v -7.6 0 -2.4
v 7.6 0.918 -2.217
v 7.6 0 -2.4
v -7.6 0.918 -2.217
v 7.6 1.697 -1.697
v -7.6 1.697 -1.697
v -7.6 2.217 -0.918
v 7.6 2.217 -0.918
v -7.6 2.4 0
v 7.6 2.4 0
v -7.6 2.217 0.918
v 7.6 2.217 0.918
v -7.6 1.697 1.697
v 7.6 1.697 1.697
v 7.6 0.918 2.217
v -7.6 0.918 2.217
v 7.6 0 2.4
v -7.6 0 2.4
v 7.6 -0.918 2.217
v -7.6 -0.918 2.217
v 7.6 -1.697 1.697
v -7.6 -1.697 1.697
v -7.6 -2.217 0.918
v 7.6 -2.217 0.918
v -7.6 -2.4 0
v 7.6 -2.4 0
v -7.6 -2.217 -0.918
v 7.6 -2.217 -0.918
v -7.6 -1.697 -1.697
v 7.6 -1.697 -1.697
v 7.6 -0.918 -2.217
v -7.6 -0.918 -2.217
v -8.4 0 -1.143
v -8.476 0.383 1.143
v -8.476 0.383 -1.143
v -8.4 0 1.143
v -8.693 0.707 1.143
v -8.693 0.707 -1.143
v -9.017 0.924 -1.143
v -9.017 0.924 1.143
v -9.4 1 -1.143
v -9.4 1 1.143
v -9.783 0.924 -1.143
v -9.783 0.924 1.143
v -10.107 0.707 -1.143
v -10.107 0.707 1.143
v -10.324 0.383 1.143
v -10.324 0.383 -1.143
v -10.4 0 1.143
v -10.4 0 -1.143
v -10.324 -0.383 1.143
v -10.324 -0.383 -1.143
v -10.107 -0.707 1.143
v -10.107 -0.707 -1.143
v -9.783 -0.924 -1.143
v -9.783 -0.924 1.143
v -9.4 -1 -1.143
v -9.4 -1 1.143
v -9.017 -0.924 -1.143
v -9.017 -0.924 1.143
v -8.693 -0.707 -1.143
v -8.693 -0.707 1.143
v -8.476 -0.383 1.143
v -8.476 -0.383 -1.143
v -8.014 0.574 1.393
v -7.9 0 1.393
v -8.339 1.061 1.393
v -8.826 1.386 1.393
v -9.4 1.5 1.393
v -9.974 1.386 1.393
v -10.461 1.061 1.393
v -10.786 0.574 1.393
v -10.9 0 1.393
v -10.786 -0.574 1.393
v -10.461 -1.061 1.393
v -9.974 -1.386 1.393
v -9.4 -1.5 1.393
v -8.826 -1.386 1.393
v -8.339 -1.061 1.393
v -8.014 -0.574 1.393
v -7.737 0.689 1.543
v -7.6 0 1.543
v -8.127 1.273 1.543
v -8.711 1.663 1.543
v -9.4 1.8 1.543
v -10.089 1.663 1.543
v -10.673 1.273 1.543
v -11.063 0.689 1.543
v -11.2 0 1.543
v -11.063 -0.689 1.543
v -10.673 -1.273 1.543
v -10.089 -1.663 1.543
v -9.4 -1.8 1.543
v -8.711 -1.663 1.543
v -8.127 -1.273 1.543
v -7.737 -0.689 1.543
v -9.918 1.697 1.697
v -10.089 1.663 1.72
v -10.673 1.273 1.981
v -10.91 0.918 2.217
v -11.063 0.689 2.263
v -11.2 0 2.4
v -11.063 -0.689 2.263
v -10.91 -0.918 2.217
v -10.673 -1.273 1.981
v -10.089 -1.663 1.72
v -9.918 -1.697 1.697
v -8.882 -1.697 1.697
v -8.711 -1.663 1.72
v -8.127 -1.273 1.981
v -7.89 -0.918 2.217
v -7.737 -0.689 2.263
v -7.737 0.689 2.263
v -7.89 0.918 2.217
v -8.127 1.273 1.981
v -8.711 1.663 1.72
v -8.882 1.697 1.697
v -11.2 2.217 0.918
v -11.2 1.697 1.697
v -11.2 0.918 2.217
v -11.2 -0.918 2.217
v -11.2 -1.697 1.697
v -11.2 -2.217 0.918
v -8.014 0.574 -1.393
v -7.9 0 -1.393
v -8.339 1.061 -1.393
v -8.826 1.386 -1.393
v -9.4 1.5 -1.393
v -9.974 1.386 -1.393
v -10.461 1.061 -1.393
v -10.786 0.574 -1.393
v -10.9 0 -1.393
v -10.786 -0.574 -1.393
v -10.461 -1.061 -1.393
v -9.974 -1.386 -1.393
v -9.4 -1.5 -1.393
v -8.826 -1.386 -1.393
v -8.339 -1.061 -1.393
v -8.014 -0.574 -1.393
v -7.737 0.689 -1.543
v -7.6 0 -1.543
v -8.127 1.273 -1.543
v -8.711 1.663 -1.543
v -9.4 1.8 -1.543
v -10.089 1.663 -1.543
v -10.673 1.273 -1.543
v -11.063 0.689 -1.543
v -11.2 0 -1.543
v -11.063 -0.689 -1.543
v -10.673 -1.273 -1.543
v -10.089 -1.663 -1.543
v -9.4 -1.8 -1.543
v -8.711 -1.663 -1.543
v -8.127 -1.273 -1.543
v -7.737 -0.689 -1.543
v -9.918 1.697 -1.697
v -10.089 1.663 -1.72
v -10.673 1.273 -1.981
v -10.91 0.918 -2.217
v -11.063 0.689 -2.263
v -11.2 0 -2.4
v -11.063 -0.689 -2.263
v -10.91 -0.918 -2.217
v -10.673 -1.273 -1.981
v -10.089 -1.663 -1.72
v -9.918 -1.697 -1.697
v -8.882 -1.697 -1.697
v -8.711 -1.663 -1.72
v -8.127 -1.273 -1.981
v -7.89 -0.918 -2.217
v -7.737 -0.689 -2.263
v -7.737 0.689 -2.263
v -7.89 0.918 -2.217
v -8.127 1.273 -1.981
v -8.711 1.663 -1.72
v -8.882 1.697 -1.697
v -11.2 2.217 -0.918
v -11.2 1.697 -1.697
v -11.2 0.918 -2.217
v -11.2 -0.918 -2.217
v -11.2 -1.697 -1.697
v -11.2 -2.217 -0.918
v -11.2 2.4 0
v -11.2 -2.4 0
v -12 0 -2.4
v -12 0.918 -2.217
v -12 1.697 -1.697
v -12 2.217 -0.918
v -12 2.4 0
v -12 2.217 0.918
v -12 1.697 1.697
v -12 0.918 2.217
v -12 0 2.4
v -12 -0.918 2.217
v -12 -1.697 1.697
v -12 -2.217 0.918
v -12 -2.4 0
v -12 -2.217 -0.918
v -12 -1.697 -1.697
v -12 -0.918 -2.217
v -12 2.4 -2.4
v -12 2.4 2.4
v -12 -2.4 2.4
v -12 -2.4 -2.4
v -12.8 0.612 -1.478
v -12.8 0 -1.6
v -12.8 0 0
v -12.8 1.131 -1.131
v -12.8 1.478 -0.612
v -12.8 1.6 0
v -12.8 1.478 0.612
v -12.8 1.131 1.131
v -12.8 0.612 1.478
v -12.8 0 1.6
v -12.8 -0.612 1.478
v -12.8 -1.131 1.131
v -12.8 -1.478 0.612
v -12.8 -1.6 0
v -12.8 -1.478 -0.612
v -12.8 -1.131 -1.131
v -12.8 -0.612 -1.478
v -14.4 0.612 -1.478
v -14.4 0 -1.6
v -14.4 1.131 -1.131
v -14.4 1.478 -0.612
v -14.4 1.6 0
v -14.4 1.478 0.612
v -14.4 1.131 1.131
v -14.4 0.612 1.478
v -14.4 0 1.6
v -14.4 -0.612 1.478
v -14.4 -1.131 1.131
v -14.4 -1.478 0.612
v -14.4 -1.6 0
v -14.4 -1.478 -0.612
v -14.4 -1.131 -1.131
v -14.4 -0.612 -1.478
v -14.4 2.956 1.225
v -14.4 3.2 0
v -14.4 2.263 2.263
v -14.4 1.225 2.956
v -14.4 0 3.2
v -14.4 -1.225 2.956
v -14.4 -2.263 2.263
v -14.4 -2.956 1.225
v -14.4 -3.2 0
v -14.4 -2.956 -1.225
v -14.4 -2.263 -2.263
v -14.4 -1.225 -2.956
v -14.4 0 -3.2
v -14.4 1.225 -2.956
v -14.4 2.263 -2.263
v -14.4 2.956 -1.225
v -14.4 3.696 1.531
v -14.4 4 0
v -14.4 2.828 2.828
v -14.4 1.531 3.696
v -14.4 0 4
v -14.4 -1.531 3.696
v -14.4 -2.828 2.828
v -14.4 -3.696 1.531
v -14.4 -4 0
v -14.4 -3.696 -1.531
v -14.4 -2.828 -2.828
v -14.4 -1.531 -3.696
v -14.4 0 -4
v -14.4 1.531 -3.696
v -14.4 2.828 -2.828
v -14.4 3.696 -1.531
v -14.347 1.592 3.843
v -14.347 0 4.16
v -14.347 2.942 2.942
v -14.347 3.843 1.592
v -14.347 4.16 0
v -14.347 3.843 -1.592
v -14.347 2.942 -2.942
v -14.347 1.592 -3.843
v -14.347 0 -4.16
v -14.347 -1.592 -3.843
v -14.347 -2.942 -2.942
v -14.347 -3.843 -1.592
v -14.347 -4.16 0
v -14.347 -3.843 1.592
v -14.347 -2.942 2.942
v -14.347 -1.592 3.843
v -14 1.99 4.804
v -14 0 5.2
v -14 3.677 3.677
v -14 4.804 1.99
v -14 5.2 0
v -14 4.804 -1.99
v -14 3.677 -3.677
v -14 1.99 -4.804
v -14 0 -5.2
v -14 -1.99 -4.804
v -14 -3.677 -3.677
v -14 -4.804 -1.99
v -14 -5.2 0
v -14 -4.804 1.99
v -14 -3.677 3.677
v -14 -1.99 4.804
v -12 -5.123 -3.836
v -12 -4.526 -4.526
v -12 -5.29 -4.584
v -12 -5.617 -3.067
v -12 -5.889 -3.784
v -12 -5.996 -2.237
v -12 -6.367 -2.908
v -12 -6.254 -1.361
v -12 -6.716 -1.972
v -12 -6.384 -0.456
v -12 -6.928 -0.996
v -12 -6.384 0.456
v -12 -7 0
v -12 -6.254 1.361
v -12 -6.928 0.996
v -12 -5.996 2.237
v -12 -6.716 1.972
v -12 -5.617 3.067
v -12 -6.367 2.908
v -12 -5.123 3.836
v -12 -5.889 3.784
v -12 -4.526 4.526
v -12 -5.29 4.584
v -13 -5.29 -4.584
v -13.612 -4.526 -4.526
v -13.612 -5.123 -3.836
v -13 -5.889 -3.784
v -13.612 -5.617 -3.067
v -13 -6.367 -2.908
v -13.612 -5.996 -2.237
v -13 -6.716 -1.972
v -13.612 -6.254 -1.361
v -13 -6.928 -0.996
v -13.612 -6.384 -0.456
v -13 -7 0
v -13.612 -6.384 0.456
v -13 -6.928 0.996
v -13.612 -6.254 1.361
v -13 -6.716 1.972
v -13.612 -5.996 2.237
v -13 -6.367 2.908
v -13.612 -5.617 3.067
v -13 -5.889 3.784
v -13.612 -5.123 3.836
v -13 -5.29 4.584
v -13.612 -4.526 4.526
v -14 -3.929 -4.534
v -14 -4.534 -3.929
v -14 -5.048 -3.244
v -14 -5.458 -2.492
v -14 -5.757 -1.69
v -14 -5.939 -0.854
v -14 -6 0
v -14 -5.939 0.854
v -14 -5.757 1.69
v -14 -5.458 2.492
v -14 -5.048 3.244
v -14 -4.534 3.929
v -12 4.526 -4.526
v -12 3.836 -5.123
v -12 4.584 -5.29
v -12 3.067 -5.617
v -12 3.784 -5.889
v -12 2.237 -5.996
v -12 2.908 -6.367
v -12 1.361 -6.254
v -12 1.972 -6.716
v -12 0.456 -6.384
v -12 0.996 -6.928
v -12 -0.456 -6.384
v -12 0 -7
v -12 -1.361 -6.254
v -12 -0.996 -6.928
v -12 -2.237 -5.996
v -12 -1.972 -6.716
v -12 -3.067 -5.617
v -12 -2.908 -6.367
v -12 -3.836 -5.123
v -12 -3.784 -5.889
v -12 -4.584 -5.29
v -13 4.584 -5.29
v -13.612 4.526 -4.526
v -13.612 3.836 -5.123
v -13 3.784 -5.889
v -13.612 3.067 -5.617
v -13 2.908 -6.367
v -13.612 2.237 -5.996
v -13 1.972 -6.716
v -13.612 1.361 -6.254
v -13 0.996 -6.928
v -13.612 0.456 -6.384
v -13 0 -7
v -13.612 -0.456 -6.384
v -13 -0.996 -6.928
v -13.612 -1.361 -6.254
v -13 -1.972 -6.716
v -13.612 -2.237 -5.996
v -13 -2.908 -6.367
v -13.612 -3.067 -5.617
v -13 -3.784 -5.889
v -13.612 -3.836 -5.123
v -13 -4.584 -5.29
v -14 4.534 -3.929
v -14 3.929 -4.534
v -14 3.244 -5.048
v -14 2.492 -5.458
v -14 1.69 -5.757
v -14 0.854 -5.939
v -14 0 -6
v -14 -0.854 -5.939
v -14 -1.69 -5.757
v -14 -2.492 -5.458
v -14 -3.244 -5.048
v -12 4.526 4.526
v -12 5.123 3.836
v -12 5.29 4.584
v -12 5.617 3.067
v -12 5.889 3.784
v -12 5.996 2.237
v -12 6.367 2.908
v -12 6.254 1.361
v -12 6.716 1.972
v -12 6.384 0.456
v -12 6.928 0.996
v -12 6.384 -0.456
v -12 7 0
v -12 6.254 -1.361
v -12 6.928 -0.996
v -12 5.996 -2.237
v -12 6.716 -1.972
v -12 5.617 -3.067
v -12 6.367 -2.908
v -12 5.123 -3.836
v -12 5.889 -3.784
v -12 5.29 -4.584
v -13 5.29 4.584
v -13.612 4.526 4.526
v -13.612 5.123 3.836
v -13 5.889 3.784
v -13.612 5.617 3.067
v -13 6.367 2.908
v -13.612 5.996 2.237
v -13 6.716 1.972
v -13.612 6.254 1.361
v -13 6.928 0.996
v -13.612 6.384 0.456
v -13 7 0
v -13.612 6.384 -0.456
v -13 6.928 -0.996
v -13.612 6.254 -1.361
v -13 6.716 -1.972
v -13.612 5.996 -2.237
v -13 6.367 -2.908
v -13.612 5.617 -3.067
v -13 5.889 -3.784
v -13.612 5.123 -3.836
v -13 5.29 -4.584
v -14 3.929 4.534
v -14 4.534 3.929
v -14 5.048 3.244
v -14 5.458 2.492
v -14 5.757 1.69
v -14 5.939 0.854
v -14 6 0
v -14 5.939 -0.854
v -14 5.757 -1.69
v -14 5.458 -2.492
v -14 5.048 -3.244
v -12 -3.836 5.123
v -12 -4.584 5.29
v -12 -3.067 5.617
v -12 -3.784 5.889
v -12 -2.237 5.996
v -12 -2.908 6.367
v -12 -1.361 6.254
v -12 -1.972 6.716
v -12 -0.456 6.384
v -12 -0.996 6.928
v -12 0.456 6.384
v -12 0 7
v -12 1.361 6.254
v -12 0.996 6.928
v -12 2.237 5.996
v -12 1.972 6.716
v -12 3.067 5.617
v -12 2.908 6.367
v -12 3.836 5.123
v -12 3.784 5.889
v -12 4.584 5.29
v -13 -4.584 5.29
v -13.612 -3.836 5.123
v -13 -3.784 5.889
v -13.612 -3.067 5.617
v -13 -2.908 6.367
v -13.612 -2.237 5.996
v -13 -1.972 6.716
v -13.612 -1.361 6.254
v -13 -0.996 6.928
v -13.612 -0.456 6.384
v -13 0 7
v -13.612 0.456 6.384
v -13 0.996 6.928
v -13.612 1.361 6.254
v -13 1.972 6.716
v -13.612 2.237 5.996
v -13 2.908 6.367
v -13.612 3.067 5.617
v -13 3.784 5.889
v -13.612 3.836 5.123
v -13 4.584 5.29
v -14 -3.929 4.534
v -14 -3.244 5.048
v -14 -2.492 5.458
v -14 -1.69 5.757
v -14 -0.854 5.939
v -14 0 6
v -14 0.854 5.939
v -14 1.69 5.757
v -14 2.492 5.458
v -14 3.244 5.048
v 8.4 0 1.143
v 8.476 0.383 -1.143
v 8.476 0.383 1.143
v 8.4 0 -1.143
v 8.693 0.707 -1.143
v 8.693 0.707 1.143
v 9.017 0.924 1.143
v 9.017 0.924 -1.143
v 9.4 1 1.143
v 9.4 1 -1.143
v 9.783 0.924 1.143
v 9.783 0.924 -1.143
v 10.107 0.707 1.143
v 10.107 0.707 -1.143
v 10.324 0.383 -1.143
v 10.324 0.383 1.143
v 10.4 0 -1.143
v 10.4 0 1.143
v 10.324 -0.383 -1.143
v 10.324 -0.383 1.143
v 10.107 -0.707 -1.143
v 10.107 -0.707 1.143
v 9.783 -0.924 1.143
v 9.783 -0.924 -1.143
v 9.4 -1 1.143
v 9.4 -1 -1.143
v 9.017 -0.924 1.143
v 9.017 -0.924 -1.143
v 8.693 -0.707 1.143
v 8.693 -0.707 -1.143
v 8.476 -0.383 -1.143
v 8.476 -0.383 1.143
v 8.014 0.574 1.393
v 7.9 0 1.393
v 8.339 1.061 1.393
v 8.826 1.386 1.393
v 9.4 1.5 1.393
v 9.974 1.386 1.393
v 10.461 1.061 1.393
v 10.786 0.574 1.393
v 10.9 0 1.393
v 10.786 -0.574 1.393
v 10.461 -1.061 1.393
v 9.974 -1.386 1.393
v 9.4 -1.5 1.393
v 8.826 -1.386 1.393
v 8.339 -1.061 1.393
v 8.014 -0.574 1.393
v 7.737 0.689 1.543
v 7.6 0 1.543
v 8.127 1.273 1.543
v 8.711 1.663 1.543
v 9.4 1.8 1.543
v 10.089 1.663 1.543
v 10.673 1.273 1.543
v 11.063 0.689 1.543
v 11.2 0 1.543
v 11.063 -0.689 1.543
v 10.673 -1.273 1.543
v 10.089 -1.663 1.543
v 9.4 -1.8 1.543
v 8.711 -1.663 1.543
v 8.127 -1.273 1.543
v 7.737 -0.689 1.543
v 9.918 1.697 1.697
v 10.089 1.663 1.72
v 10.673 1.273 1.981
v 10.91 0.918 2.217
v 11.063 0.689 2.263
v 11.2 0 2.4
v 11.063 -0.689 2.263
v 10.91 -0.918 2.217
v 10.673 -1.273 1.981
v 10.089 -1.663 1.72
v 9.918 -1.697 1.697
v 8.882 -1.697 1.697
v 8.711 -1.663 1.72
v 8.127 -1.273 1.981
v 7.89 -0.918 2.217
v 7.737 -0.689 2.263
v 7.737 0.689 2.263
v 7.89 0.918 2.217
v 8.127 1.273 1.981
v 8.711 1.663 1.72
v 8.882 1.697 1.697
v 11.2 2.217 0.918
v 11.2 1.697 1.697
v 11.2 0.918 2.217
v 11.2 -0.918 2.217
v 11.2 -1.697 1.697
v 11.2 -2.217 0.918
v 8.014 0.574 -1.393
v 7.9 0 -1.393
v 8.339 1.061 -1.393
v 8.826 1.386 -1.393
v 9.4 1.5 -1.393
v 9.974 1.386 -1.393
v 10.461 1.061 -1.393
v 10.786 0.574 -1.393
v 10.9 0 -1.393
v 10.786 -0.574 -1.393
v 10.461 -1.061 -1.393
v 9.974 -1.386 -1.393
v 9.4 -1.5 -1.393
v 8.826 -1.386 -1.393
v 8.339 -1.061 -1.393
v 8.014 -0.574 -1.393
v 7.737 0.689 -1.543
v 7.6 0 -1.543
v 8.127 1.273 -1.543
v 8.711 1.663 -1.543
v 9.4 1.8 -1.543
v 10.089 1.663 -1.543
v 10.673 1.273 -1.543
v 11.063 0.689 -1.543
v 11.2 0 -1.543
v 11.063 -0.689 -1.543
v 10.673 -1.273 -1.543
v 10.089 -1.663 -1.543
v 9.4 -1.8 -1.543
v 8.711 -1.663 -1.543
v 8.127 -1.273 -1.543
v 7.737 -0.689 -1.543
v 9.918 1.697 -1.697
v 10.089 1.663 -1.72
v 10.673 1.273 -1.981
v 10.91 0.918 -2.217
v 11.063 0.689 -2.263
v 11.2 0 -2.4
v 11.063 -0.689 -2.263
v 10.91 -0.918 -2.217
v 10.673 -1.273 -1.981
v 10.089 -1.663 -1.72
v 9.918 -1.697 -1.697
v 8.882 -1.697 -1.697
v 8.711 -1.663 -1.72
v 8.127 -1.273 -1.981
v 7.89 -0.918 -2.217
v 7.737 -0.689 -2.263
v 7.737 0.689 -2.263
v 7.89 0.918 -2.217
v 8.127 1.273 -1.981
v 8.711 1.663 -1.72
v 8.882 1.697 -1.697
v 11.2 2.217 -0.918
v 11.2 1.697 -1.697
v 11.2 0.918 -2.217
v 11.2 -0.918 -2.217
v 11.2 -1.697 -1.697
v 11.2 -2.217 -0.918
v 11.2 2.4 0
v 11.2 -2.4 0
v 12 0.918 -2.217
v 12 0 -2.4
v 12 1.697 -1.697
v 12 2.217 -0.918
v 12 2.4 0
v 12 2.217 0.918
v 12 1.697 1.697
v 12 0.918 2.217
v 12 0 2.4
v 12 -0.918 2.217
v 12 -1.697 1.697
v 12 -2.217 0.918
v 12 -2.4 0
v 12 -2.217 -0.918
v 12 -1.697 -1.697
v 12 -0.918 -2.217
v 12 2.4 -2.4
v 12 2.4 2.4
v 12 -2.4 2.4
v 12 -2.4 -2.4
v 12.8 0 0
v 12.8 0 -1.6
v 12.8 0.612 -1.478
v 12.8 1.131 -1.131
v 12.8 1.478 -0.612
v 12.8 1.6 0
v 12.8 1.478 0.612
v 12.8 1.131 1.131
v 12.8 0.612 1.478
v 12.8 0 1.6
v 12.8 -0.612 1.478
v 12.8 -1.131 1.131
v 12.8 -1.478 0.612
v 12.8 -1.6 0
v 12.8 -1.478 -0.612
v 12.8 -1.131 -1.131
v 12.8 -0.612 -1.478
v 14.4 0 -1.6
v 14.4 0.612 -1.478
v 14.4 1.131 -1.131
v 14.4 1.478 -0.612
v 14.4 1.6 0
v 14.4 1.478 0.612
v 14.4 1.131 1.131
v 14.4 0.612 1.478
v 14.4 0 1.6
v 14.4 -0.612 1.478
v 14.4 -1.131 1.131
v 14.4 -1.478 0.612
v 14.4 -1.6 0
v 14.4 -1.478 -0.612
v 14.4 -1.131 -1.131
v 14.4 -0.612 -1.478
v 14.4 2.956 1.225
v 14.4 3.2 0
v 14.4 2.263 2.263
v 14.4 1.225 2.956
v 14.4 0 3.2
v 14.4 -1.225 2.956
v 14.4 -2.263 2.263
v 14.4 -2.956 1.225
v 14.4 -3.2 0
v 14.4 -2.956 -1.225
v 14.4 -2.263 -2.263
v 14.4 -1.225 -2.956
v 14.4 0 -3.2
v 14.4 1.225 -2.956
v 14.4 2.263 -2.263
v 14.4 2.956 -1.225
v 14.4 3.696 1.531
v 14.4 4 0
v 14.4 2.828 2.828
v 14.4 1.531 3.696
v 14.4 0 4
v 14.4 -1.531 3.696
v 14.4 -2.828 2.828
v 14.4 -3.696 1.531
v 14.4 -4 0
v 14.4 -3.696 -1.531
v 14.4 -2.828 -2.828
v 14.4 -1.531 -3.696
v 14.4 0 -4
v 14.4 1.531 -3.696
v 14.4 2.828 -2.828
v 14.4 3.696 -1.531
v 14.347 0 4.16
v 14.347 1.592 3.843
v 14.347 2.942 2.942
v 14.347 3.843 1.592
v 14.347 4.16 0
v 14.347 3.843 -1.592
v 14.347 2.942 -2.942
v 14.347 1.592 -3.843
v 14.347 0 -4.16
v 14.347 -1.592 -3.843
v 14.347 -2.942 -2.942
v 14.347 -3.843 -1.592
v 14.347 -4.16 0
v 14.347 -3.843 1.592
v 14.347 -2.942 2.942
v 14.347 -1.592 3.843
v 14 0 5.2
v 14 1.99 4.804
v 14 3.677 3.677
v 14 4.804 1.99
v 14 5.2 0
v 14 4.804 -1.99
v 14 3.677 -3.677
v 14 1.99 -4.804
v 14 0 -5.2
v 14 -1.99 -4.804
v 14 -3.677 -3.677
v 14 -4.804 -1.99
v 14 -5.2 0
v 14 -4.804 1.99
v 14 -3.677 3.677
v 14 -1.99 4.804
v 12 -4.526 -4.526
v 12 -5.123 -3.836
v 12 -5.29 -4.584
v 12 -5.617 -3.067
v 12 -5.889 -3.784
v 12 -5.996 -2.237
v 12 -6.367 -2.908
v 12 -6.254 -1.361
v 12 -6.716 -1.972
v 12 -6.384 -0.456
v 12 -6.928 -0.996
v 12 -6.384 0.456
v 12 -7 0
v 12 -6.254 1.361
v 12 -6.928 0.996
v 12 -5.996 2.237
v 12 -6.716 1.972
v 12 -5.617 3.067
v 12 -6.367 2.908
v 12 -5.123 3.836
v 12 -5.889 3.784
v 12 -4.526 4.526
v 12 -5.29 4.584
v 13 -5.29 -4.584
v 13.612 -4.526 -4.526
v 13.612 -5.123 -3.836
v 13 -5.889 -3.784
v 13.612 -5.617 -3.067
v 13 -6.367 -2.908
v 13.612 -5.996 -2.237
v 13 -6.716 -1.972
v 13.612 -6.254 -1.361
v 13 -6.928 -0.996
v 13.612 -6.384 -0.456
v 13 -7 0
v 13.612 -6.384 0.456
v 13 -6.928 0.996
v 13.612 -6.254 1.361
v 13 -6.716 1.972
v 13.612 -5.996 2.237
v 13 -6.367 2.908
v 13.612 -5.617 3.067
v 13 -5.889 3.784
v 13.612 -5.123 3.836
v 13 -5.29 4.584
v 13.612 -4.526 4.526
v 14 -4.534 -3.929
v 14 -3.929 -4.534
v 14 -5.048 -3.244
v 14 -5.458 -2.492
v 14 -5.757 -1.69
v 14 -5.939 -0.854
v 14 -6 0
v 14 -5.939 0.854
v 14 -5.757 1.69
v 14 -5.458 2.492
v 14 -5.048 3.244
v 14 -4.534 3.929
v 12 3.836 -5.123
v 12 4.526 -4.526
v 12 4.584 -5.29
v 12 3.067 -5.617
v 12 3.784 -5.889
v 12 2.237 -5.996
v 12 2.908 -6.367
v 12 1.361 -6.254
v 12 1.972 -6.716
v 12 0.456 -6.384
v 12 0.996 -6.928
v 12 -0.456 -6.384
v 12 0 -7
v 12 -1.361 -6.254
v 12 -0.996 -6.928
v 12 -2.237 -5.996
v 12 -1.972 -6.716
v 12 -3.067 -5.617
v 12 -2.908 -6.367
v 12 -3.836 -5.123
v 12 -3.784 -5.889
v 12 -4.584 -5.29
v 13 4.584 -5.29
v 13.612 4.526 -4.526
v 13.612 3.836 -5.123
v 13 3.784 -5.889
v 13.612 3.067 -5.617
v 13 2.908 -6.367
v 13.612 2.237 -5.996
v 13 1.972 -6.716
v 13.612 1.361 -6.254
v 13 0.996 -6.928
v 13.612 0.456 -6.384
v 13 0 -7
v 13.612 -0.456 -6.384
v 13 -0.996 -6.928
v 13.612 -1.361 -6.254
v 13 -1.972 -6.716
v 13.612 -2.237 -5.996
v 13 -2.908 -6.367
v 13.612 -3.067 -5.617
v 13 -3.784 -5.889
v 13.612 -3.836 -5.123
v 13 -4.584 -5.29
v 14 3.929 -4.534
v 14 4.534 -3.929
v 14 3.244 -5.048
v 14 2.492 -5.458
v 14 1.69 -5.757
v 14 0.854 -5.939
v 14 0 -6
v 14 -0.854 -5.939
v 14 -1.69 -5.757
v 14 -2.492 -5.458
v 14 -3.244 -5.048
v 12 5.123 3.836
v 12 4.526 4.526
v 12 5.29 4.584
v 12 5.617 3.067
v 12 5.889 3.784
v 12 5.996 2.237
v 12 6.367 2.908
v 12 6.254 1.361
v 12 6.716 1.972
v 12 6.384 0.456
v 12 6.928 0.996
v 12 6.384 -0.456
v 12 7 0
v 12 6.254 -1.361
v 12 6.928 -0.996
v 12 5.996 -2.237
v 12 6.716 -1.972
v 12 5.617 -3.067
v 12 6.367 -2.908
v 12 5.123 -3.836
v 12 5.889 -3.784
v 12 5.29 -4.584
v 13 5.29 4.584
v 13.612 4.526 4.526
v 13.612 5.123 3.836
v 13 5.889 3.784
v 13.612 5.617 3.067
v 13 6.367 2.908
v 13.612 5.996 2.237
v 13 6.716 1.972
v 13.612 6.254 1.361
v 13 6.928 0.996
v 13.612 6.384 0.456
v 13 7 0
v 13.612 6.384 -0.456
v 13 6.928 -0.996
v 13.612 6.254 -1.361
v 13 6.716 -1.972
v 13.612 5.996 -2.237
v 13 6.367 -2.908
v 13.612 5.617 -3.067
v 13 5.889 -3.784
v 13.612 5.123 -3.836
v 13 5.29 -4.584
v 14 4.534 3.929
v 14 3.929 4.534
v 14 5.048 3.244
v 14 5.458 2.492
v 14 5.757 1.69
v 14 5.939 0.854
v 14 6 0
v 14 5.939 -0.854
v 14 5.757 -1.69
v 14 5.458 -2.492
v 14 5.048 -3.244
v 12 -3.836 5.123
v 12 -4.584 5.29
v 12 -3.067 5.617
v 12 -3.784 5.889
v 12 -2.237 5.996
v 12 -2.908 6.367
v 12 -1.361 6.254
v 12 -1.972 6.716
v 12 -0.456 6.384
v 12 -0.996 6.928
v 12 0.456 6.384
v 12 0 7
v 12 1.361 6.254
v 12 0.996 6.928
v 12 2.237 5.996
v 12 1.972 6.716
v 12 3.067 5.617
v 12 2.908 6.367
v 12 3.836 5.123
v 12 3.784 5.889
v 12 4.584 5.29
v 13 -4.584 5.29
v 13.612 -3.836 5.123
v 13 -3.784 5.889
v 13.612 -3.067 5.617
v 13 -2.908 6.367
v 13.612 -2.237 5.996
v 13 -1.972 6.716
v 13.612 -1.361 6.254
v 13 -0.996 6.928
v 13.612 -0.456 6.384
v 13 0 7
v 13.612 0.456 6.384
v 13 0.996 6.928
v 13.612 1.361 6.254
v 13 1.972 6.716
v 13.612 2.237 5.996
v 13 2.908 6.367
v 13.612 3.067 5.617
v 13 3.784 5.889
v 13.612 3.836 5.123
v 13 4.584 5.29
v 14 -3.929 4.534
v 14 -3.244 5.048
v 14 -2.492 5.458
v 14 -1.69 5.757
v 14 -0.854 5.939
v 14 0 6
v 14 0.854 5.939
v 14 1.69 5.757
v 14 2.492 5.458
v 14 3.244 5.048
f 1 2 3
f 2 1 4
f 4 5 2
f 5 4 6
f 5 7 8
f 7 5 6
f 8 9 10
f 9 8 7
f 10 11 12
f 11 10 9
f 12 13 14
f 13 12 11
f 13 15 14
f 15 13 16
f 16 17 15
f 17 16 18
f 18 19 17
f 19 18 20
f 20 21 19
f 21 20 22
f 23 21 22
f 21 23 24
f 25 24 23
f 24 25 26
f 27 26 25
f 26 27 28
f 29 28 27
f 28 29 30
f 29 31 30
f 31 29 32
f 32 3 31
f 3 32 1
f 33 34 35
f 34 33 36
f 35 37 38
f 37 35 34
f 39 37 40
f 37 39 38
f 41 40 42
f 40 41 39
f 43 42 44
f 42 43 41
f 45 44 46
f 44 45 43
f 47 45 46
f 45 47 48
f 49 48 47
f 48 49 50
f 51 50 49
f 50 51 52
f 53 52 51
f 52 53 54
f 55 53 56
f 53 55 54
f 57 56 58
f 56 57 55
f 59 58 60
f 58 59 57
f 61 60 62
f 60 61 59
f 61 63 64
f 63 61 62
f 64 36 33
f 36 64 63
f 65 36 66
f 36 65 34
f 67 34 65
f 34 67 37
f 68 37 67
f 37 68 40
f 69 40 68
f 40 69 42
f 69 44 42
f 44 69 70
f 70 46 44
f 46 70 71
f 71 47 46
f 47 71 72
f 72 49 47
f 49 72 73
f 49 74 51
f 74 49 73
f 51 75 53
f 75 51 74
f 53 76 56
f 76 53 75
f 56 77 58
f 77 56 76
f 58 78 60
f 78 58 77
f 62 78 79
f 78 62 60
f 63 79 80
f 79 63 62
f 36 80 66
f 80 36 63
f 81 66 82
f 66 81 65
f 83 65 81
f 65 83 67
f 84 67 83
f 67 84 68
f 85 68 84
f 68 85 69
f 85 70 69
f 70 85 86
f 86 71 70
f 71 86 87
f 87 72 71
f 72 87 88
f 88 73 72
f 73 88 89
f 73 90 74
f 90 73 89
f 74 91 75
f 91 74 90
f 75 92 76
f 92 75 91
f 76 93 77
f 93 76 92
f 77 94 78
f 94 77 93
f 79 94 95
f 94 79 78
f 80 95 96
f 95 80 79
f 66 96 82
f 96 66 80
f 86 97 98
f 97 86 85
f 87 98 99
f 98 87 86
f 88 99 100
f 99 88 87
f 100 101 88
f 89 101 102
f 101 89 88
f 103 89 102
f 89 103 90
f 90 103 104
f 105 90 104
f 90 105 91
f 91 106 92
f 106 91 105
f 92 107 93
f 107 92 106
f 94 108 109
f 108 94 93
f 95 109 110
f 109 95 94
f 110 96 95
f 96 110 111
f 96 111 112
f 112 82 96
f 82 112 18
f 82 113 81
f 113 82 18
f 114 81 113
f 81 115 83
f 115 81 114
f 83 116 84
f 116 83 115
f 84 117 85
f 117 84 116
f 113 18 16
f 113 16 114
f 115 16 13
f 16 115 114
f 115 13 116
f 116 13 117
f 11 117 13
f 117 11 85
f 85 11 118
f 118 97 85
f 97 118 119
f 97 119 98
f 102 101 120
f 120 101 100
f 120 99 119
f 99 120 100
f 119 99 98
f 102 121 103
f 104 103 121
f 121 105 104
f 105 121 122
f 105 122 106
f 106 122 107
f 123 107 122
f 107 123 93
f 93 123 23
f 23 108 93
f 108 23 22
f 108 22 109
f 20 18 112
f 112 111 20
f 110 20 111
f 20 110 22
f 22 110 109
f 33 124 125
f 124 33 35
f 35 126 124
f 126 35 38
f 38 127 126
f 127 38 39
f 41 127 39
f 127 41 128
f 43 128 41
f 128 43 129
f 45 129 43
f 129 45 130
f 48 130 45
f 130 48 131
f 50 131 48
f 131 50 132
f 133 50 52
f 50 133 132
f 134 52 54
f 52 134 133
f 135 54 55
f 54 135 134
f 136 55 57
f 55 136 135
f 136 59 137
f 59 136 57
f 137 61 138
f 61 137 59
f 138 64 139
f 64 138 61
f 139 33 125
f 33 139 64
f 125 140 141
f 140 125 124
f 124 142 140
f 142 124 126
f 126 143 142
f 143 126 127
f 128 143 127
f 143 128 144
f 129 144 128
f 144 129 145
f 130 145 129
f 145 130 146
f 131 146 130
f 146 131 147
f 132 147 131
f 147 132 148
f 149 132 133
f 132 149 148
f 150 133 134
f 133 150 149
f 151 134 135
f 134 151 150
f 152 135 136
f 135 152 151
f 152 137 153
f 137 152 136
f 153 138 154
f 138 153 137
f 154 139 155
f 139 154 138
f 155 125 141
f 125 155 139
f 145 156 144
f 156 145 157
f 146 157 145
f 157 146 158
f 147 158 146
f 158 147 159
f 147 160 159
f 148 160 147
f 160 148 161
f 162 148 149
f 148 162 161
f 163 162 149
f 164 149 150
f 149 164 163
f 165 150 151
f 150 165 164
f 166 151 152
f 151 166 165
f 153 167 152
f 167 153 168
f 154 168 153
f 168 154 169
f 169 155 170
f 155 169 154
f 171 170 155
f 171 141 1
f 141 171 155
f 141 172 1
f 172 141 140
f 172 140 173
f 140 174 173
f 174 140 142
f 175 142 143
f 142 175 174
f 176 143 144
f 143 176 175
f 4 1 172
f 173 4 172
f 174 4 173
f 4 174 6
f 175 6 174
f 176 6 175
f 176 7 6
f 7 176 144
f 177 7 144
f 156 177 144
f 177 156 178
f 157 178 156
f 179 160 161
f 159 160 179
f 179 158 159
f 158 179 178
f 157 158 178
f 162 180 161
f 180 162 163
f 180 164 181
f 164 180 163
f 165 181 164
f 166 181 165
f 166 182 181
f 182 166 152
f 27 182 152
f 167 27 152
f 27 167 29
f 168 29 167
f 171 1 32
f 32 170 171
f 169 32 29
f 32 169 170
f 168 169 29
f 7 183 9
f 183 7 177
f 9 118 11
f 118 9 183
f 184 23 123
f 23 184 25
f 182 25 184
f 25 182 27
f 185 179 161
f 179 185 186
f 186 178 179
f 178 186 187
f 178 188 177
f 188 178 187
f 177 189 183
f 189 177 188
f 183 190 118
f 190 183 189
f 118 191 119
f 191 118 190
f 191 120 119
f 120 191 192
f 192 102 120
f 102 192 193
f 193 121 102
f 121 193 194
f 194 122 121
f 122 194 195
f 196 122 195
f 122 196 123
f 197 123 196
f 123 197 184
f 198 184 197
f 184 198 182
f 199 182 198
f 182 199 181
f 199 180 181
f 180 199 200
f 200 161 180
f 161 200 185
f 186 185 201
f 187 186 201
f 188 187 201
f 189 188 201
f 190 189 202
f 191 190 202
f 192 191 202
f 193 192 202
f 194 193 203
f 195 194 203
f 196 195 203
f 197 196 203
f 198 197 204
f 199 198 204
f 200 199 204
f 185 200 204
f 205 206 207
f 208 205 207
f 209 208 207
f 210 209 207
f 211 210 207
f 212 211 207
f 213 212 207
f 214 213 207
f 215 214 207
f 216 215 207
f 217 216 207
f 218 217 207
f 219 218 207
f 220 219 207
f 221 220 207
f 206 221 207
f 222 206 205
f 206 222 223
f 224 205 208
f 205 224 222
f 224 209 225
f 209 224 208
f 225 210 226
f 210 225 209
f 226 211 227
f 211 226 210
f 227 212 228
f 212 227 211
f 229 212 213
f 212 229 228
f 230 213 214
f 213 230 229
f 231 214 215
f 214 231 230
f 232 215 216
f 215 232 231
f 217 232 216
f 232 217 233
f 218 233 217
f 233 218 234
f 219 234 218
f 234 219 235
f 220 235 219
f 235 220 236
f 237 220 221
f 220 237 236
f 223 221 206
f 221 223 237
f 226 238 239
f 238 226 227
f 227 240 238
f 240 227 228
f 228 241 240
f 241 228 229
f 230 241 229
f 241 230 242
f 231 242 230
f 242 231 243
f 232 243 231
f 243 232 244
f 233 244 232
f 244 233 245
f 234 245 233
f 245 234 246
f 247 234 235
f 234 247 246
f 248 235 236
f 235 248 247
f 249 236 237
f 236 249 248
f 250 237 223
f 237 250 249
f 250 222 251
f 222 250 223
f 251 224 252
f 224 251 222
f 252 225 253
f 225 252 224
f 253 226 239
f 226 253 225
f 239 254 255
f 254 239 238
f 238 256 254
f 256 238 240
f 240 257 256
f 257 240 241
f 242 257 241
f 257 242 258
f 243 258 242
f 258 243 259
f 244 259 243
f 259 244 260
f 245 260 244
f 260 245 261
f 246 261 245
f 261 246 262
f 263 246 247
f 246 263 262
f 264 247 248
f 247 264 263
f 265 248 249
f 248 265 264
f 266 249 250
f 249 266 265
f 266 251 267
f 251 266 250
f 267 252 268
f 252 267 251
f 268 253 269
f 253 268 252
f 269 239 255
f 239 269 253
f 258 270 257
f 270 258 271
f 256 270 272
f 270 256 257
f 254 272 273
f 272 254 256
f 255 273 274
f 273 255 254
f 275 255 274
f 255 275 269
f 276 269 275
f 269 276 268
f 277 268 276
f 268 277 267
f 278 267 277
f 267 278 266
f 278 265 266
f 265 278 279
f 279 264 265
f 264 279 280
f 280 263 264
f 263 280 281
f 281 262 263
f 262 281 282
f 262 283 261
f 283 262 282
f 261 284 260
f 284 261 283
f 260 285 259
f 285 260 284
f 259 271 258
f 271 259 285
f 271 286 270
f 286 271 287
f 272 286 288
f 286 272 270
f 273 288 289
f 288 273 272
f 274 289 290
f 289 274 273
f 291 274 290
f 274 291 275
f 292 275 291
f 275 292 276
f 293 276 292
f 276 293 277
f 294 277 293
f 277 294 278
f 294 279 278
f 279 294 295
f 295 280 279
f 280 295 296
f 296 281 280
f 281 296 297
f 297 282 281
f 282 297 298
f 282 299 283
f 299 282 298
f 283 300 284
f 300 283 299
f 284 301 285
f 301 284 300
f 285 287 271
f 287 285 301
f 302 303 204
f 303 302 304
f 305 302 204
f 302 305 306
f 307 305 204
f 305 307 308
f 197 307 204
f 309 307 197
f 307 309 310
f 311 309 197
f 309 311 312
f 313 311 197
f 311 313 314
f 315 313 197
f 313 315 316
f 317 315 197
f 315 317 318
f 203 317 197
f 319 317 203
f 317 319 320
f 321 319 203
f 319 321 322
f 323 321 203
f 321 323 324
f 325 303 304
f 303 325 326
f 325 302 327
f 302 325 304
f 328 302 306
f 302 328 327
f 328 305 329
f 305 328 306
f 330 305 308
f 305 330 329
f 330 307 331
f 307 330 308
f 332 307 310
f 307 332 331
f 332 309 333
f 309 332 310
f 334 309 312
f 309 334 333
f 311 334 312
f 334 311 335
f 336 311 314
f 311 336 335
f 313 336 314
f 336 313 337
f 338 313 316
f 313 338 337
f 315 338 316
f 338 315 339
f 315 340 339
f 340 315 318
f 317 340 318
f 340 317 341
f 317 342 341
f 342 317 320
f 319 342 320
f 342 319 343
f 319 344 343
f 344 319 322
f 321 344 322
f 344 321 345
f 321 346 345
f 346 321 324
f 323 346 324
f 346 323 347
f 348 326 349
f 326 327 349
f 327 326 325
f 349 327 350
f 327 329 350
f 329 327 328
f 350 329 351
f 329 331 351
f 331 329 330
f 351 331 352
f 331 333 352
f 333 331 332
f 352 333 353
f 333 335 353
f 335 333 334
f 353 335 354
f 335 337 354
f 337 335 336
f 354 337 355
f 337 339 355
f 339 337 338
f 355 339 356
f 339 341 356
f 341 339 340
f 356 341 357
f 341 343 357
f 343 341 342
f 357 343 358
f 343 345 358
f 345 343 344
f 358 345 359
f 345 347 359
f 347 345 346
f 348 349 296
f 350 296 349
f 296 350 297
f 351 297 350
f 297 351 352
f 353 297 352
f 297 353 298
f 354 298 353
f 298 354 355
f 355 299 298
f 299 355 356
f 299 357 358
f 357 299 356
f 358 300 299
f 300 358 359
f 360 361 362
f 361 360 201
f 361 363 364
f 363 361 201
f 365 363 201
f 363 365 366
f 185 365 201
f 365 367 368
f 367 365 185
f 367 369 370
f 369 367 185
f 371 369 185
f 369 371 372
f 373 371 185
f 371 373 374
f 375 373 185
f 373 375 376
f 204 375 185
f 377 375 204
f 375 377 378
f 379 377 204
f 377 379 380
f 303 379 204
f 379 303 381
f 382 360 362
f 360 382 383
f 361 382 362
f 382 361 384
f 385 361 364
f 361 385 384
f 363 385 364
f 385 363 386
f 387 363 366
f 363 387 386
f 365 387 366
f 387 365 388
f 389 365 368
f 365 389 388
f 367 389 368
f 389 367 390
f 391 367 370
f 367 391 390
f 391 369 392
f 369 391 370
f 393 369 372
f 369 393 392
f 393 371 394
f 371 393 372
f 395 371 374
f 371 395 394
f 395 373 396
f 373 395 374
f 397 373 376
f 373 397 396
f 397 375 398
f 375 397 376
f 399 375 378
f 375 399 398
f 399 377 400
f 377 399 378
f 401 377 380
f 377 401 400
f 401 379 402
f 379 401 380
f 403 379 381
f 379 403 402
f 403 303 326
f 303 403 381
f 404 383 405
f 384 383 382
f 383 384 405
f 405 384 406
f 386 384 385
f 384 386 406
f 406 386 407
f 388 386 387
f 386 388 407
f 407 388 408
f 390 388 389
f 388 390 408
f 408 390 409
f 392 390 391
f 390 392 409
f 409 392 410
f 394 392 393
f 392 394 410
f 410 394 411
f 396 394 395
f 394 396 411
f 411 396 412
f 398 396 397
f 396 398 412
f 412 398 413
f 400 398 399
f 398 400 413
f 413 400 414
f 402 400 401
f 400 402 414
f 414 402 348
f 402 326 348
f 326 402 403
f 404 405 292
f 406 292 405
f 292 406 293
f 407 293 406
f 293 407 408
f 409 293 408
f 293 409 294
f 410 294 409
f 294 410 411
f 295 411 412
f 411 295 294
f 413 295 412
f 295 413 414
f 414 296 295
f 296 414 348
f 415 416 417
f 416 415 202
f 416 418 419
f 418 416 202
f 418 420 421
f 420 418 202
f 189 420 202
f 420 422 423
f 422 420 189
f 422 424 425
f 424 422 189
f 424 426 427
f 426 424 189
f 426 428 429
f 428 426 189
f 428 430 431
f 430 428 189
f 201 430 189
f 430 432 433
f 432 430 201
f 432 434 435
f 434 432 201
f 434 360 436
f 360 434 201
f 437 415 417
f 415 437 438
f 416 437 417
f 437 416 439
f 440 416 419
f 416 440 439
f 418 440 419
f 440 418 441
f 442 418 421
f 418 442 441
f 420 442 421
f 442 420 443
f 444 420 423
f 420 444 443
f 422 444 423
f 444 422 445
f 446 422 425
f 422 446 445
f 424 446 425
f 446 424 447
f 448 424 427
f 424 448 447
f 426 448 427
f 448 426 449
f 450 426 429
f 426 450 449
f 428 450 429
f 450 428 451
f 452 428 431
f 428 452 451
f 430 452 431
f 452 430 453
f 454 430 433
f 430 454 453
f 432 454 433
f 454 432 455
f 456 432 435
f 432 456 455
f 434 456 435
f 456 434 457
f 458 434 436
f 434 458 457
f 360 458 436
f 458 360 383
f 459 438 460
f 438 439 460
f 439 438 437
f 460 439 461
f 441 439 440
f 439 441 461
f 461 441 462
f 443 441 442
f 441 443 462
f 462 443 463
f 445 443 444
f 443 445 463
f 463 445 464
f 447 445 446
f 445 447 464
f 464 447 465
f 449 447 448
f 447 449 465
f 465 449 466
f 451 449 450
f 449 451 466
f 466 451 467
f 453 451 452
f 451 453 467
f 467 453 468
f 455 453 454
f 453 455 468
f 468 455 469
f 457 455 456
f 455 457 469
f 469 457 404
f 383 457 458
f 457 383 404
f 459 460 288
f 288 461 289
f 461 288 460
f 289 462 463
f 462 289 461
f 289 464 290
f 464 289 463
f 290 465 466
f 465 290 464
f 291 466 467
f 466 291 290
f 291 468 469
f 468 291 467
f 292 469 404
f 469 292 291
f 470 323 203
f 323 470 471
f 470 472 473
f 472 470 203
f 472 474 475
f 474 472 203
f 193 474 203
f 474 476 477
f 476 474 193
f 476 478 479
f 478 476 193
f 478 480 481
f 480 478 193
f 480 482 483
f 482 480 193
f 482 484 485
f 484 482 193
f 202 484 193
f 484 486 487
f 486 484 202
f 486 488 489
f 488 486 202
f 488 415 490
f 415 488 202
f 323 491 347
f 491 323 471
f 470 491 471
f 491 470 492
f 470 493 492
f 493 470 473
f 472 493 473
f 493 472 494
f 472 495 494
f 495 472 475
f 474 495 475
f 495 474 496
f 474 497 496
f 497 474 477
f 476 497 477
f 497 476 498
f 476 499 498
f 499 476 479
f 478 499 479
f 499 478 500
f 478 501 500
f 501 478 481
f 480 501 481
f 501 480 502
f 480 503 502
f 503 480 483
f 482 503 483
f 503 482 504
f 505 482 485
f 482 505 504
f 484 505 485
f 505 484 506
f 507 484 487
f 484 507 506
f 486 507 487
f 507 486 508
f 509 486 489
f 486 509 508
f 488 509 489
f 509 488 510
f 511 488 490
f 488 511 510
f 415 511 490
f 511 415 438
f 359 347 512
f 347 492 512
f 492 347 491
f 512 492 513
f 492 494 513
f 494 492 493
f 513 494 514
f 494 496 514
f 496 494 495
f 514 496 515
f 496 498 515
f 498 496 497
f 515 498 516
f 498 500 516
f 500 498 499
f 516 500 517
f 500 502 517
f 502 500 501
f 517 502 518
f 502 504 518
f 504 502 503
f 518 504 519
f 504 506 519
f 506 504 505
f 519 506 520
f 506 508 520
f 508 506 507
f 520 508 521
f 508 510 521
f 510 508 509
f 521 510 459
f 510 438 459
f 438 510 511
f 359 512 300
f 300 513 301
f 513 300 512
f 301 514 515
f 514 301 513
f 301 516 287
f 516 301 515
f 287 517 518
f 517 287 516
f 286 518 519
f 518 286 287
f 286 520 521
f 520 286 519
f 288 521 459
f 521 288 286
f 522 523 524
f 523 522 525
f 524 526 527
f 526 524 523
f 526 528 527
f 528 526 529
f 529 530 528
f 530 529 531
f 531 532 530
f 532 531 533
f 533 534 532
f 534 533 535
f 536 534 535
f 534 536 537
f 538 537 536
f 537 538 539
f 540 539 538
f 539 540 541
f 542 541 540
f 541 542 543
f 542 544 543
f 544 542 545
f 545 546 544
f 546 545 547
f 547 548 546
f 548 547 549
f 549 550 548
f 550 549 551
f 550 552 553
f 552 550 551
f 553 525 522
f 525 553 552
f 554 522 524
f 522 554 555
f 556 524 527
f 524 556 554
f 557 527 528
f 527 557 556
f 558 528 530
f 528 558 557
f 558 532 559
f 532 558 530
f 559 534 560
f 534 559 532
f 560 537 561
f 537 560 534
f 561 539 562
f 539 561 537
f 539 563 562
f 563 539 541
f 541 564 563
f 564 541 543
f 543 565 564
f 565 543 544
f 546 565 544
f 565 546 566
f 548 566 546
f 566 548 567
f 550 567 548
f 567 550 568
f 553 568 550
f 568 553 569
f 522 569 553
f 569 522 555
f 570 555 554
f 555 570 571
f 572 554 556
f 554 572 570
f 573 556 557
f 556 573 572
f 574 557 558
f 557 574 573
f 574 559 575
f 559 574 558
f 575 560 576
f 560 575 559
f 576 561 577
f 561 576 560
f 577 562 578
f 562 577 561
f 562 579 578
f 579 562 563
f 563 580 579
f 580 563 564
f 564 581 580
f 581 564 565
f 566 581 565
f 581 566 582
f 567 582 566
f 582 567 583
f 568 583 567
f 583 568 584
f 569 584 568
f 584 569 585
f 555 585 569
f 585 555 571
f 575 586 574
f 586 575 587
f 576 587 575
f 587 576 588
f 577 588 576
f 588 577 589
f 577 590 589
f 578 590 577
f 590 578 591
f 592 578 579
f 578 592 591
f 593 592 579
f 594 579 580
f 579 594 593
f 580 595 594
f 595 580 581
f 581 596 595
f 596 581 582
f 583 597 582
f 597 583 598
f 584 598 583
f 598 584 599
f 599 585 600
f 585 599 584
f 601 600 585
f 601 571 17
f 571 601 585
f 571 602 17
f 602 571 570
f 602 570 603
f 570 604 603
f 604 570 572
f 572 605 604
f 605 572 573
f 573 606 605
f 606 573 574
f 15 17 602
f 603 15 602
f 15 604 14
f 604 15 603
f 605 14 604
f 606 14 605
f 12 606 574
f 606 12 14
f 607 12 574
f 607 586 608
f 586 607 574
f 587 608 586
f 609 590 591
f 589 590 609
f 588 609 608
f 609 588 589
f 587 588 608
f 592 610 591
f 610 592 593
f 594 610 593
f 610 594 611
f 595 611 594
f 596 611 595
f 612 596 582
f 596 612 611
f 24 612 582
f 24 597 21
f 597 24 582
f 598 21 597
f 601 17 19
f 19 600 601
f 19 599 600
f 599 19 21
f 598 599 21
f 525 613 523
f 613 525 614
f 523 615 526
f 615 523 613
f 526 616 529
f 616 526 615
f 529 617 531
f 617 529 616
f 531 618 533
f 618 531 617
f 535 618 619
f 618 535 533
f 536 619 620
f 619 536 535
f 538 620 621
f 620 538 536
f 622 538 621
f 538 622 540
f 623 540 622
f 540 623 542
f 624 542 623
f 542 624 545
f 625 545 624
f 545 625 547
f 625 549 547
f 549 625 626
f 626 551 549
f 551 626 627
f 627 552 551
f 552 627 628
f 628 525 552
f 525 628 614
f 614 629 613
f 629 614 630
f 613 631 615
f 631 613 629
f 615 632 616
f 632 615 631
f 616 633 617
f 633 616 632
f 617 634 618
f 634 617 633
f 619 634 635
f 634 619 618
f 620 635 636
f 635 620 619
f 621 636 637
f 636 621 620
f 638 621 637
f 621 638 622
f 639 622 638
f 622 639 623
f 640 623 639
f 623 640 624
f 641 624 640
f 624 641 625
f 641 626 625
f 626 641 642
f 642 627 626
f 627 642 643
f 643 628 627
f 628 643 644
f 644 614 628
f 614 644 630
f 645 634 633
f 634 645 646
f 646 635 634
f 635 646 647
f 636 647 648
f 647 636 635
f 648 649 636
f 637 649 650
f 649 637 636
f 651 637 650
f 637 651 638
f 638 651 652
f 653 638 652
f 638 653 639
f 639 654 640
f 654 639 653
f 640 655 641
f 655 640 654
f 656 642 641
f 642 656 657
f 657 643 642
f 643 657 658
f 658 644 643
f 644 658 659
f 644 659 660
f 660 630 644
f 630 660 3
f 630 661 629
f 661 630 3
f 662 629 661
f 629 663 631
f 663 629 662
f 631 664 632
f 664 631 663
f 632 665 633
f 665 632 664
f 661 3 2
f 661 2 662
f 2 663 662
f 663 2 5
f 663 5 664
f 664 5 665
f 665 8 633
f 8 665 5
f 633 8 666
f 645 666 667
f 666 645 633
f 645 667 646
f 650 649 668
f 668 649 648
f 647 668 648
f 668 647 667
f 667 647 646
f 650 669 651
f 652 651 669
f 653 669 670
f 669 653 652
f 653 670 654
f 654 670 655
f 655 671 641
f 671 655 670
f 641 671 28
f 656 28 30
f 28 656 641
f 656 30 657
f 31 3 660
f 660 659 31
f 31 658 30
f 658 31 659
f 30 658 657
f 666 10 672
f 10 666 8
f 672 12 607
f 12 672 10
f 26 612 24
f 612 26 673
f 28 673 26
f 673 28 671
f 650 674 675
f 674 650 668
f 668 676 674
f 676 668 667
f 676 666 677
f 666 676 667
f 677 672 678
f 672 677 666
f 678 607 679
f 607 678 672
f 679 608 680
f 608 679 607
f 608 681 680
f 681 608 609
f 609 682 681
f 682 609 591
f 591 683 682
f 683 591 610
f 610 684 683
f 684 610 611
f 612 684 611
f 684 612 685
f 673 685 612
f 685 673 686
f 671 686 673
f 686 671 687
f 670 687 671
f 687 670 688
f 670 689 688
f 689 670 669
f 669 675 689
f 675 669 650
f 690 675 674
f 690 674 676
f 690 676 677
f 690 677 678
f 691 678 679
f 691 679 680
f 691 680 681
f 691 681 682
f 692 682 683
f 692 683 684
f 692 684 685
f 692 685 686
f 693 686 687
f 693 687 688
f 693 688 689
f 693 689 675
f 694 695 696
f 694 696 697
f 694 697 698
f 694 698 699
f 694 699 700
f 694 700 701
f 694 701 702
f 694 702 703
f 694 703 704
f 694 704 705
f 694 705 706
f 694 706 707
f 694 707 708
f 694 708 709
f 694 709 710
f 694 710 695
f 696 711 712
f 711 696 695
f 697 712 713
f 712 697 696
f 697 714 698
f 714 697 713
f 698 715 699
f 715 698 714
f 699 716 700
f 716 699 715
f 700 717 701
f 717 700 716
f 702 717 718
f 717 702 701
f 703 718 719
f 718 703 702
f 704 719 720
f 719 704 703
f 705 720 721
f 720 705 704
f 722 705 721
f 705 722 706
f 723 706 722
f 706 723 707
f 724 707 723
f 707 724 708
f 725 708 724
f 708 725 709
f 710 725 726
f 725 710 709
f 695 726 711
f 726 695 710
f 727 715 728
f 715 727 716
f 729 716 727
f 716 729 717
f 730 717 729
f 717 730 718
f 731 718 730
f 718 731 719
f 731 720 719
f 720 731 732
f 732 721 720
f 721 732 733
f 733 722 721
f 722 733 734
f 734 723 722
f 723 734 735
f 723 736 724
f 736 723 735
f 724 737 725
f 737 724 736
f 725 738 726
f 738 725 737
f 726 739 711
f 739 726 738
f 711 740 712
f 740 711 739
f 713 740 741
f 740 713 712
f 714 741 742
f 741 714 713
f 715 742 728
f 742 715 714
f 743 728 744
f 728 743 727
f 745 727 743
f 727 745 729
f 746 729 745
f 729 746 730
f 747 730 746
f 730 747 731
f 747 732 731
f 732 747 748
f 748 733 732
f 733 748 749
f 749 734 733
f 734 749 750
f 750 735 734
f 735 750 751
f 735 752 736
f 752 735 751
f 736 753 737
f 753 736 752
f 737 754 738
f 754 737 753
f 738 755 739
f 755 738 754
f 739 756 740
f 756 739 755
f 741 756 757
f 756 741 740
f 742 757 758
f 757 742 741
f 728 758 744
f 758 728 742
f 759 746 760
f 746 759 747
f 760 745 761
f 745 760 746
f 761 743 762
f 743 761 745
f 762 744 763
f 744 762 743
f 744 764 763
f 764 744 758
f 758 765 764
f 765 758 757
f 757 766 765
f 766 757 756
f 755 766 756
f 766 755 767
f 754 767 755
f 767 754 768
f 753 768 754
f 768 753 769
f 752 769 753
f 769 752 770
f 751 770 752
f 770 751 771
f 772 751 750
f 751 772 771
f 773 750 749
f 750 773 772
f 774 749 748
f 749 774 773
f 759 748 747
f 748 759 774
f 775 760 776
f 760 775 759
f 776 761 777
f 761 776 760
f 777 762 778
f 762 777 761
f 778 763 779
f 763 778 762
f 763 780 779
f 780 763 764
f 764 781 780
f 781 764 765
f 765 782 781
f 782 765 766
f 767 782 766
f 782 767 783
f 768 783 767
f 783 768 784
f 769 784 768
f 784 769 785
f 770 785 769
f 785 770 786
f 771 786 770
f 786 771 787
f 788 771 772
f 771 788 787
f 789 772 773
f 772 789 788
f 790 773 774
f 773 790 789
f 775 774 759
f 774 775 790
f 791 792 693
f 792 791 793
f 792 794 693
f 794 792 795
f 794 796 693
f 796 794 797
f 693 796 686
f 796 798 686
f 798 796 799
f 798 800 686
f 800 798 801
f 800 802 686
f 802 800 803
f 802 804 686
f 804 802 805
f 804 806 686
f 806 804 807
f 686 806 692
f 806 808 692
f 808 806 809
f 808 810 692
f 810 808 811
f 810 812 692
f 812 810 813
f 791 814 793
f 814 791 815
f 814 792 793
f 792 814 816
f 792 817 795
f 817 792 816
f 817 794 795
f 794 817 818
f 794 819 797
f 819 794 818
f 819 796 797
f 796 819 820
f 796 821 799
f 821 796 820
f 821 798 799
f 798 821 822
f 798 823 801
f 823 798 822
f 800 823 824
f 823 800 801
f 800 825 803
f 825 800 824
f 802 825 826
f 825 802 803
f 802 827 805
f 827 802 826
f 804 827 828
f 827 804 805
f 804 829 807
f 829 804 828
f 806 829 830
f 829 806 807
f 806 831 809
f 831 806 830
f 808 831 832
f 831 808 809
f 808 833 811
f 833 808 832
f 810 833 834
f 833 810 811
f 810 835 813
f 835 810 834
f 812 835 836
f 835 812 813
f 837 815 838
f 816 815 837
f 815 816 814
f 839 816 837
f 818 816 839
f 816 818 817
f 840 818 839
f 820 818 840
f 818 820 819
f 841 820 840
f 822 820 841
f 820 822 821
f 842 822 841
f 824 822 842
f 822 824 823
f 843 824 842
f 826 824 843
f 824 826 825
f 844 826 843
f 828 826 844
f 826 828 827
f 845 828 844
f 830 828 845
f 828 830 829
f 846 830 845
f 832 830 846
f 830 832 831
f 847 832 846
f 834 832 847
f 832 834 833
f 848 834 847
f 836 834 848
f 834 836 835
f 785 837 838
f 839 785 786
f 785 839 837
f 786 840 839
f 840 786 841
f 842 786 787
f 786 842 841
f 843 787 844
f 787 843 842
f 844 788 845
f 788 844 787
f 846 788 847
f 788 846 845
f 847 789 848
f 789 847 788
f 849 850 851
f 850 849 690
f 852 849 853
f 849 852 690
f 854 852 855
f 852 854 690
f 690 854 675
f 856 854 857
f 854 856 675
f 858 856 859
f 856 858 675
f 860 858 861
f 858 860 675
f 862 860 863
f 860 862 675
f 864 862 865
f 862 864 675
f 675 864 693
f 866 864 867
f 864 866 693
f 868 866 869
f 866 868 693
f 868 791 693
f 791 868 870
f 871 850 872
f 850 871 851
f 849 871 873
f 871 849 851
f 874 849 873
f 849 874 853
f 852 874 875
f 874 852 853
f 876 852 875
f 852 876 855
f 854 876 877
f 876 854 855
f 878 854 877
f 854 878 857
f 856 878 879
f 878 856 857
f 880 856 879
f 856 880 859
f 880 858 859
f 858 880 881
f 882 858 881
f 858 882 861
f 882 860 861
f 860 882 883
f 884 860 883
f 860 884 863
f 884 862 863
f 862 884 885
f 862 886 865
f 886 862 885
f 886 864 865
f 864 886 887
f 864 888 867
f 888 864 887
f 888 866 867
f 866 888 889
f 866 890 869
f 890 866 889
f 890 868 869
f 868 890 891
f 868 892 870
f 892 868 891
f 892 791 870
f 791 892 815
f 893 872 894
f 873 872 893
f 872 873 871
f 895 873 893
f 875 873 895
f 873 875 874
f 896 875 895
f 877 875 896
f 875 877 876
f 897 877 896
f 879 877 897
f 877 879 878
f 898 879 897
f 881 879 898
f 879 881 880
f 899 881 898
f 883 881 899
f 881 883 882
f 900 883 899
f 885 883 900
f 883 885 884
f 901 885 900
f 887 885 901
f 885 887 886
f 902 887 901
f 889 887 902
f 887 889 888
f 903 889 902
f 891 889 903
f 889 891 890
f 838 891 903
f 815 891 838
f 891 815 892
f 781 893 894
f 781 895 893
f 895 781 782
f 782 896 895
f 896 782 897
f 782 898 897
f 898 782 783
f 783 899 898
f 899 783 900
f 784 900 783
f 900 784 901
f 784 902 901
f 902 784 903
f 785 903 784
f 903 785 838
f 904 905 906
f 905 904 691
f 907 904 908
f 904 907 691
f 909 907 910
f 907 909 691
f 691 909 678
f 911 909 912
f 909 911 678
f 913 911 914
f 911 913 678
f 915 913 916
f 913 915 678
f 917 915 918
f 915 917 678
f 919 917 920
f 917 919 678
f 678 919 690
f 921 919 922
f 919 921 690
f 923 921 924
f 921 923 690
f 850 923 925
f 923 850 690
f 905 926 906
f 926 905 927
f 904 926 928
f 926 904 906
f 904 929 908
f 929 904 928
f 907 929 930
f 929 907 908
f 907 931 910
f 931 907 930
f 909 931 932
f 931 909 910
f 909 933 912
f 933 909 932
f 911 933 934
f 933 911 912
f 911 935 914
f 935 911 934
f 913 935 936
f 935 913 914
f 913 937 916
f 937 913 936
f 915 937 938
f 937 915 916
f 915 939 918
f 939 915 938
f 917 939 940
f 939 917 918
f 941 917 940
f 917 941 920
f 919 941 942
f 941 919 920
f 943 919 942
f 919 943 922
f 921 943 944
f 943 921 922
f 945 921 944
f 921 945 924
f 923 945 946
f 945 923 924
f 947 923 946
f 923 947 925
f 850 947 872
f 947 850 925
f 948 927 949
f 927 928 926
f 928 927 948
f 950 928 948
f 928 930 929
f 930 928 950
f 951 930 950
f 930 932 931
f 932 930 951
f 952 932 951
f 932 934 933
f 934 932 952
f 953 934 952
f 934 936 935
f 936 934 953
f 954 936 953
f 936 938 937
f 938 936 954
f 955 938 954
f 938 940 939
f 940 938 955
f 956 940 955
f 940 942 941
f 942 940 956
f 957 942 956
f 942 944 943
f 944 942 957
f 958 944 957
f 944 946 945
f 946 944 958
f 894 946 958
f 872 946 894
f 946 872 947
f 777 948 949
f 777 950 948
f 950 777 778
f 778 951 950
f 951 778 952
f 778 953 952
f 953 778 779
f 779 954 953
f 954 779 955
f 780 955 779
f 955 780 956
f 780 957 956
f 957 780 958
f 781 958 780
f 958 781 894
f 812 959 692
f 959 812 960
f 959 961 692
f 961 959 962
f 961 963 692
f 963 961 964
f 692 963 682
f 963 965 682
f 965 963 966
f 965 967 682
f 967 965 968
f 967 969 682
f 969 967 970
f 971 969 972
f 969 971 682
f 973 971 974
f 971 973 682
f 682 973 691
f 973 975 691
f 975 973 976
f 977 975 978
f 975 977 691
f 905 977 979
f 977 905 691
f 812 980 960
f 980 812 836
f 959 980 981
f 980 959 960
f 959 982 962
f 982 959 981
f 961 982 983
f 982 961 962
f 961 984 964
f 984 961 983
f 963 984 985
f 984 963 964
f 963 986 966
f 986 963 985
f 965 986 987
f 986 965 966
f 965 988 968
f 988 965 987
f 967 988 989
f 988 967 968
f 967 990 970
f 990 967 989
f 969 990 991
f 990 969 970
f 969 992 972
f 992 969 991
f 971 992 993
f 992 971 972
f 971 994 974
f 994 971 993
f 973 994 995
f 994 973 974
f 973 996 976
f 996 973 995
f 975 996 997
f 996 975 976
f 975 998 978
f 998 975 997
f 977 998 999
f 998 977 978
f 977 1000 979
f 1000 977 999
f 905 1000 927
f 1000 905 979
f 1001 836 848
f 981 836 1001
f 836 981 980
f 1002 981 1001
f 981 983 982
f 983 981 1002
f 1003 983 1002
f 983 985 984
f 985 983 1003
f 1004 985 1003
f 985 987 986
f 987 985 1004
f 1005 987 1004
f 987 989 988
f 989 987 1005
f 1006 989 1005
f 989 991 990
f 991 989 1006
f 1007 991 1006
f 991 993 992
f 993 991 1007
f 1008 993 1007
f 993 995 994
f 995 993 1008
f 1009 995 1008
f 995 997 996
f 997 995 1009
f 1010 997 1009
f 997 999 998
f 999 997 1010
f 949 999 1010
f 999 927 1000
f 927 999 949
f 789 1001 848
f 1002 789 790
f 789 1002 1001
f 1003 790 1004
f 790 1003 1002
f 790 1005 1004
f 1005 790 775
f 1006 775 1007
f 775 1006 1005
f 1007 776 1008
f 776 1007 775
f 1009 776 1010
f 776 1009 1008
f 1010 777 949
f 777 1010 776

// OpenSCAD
use <../lib.scad>
use <4208.scad>
function ldraw_lib__4210() = [
// 0 ~Moved to 4208
// 0 Name: 4210.dat
// 0 Author: [PTadmin]
// 0 !LDRAW_ORG Part UPDATE 2010-01
// 0 !LICENSE Licensed under CC BY 4.0 : see CAreadme.txt
// 
// 0 BFC CERTIFY CCW
  [0,"BFC","CERTIFY"],
  [0,"BFC","CCW"],
// 
// 0 !HISTORY 2010-04-05 [PTadmin] Official Update 2010-01
// 
// 
// 0 // Hose Reel 2 x 4 x 2 Drum
// 1 16 0 0 0 1 0 0 0 1 0 0 0 1 4208.dat
  [1,16,0,0,0,1,0,0,0,1,0,0,0,1, ldraw_lib__4208()],
];
makepoly(ldraw_lib__4210(), line=0.2);
